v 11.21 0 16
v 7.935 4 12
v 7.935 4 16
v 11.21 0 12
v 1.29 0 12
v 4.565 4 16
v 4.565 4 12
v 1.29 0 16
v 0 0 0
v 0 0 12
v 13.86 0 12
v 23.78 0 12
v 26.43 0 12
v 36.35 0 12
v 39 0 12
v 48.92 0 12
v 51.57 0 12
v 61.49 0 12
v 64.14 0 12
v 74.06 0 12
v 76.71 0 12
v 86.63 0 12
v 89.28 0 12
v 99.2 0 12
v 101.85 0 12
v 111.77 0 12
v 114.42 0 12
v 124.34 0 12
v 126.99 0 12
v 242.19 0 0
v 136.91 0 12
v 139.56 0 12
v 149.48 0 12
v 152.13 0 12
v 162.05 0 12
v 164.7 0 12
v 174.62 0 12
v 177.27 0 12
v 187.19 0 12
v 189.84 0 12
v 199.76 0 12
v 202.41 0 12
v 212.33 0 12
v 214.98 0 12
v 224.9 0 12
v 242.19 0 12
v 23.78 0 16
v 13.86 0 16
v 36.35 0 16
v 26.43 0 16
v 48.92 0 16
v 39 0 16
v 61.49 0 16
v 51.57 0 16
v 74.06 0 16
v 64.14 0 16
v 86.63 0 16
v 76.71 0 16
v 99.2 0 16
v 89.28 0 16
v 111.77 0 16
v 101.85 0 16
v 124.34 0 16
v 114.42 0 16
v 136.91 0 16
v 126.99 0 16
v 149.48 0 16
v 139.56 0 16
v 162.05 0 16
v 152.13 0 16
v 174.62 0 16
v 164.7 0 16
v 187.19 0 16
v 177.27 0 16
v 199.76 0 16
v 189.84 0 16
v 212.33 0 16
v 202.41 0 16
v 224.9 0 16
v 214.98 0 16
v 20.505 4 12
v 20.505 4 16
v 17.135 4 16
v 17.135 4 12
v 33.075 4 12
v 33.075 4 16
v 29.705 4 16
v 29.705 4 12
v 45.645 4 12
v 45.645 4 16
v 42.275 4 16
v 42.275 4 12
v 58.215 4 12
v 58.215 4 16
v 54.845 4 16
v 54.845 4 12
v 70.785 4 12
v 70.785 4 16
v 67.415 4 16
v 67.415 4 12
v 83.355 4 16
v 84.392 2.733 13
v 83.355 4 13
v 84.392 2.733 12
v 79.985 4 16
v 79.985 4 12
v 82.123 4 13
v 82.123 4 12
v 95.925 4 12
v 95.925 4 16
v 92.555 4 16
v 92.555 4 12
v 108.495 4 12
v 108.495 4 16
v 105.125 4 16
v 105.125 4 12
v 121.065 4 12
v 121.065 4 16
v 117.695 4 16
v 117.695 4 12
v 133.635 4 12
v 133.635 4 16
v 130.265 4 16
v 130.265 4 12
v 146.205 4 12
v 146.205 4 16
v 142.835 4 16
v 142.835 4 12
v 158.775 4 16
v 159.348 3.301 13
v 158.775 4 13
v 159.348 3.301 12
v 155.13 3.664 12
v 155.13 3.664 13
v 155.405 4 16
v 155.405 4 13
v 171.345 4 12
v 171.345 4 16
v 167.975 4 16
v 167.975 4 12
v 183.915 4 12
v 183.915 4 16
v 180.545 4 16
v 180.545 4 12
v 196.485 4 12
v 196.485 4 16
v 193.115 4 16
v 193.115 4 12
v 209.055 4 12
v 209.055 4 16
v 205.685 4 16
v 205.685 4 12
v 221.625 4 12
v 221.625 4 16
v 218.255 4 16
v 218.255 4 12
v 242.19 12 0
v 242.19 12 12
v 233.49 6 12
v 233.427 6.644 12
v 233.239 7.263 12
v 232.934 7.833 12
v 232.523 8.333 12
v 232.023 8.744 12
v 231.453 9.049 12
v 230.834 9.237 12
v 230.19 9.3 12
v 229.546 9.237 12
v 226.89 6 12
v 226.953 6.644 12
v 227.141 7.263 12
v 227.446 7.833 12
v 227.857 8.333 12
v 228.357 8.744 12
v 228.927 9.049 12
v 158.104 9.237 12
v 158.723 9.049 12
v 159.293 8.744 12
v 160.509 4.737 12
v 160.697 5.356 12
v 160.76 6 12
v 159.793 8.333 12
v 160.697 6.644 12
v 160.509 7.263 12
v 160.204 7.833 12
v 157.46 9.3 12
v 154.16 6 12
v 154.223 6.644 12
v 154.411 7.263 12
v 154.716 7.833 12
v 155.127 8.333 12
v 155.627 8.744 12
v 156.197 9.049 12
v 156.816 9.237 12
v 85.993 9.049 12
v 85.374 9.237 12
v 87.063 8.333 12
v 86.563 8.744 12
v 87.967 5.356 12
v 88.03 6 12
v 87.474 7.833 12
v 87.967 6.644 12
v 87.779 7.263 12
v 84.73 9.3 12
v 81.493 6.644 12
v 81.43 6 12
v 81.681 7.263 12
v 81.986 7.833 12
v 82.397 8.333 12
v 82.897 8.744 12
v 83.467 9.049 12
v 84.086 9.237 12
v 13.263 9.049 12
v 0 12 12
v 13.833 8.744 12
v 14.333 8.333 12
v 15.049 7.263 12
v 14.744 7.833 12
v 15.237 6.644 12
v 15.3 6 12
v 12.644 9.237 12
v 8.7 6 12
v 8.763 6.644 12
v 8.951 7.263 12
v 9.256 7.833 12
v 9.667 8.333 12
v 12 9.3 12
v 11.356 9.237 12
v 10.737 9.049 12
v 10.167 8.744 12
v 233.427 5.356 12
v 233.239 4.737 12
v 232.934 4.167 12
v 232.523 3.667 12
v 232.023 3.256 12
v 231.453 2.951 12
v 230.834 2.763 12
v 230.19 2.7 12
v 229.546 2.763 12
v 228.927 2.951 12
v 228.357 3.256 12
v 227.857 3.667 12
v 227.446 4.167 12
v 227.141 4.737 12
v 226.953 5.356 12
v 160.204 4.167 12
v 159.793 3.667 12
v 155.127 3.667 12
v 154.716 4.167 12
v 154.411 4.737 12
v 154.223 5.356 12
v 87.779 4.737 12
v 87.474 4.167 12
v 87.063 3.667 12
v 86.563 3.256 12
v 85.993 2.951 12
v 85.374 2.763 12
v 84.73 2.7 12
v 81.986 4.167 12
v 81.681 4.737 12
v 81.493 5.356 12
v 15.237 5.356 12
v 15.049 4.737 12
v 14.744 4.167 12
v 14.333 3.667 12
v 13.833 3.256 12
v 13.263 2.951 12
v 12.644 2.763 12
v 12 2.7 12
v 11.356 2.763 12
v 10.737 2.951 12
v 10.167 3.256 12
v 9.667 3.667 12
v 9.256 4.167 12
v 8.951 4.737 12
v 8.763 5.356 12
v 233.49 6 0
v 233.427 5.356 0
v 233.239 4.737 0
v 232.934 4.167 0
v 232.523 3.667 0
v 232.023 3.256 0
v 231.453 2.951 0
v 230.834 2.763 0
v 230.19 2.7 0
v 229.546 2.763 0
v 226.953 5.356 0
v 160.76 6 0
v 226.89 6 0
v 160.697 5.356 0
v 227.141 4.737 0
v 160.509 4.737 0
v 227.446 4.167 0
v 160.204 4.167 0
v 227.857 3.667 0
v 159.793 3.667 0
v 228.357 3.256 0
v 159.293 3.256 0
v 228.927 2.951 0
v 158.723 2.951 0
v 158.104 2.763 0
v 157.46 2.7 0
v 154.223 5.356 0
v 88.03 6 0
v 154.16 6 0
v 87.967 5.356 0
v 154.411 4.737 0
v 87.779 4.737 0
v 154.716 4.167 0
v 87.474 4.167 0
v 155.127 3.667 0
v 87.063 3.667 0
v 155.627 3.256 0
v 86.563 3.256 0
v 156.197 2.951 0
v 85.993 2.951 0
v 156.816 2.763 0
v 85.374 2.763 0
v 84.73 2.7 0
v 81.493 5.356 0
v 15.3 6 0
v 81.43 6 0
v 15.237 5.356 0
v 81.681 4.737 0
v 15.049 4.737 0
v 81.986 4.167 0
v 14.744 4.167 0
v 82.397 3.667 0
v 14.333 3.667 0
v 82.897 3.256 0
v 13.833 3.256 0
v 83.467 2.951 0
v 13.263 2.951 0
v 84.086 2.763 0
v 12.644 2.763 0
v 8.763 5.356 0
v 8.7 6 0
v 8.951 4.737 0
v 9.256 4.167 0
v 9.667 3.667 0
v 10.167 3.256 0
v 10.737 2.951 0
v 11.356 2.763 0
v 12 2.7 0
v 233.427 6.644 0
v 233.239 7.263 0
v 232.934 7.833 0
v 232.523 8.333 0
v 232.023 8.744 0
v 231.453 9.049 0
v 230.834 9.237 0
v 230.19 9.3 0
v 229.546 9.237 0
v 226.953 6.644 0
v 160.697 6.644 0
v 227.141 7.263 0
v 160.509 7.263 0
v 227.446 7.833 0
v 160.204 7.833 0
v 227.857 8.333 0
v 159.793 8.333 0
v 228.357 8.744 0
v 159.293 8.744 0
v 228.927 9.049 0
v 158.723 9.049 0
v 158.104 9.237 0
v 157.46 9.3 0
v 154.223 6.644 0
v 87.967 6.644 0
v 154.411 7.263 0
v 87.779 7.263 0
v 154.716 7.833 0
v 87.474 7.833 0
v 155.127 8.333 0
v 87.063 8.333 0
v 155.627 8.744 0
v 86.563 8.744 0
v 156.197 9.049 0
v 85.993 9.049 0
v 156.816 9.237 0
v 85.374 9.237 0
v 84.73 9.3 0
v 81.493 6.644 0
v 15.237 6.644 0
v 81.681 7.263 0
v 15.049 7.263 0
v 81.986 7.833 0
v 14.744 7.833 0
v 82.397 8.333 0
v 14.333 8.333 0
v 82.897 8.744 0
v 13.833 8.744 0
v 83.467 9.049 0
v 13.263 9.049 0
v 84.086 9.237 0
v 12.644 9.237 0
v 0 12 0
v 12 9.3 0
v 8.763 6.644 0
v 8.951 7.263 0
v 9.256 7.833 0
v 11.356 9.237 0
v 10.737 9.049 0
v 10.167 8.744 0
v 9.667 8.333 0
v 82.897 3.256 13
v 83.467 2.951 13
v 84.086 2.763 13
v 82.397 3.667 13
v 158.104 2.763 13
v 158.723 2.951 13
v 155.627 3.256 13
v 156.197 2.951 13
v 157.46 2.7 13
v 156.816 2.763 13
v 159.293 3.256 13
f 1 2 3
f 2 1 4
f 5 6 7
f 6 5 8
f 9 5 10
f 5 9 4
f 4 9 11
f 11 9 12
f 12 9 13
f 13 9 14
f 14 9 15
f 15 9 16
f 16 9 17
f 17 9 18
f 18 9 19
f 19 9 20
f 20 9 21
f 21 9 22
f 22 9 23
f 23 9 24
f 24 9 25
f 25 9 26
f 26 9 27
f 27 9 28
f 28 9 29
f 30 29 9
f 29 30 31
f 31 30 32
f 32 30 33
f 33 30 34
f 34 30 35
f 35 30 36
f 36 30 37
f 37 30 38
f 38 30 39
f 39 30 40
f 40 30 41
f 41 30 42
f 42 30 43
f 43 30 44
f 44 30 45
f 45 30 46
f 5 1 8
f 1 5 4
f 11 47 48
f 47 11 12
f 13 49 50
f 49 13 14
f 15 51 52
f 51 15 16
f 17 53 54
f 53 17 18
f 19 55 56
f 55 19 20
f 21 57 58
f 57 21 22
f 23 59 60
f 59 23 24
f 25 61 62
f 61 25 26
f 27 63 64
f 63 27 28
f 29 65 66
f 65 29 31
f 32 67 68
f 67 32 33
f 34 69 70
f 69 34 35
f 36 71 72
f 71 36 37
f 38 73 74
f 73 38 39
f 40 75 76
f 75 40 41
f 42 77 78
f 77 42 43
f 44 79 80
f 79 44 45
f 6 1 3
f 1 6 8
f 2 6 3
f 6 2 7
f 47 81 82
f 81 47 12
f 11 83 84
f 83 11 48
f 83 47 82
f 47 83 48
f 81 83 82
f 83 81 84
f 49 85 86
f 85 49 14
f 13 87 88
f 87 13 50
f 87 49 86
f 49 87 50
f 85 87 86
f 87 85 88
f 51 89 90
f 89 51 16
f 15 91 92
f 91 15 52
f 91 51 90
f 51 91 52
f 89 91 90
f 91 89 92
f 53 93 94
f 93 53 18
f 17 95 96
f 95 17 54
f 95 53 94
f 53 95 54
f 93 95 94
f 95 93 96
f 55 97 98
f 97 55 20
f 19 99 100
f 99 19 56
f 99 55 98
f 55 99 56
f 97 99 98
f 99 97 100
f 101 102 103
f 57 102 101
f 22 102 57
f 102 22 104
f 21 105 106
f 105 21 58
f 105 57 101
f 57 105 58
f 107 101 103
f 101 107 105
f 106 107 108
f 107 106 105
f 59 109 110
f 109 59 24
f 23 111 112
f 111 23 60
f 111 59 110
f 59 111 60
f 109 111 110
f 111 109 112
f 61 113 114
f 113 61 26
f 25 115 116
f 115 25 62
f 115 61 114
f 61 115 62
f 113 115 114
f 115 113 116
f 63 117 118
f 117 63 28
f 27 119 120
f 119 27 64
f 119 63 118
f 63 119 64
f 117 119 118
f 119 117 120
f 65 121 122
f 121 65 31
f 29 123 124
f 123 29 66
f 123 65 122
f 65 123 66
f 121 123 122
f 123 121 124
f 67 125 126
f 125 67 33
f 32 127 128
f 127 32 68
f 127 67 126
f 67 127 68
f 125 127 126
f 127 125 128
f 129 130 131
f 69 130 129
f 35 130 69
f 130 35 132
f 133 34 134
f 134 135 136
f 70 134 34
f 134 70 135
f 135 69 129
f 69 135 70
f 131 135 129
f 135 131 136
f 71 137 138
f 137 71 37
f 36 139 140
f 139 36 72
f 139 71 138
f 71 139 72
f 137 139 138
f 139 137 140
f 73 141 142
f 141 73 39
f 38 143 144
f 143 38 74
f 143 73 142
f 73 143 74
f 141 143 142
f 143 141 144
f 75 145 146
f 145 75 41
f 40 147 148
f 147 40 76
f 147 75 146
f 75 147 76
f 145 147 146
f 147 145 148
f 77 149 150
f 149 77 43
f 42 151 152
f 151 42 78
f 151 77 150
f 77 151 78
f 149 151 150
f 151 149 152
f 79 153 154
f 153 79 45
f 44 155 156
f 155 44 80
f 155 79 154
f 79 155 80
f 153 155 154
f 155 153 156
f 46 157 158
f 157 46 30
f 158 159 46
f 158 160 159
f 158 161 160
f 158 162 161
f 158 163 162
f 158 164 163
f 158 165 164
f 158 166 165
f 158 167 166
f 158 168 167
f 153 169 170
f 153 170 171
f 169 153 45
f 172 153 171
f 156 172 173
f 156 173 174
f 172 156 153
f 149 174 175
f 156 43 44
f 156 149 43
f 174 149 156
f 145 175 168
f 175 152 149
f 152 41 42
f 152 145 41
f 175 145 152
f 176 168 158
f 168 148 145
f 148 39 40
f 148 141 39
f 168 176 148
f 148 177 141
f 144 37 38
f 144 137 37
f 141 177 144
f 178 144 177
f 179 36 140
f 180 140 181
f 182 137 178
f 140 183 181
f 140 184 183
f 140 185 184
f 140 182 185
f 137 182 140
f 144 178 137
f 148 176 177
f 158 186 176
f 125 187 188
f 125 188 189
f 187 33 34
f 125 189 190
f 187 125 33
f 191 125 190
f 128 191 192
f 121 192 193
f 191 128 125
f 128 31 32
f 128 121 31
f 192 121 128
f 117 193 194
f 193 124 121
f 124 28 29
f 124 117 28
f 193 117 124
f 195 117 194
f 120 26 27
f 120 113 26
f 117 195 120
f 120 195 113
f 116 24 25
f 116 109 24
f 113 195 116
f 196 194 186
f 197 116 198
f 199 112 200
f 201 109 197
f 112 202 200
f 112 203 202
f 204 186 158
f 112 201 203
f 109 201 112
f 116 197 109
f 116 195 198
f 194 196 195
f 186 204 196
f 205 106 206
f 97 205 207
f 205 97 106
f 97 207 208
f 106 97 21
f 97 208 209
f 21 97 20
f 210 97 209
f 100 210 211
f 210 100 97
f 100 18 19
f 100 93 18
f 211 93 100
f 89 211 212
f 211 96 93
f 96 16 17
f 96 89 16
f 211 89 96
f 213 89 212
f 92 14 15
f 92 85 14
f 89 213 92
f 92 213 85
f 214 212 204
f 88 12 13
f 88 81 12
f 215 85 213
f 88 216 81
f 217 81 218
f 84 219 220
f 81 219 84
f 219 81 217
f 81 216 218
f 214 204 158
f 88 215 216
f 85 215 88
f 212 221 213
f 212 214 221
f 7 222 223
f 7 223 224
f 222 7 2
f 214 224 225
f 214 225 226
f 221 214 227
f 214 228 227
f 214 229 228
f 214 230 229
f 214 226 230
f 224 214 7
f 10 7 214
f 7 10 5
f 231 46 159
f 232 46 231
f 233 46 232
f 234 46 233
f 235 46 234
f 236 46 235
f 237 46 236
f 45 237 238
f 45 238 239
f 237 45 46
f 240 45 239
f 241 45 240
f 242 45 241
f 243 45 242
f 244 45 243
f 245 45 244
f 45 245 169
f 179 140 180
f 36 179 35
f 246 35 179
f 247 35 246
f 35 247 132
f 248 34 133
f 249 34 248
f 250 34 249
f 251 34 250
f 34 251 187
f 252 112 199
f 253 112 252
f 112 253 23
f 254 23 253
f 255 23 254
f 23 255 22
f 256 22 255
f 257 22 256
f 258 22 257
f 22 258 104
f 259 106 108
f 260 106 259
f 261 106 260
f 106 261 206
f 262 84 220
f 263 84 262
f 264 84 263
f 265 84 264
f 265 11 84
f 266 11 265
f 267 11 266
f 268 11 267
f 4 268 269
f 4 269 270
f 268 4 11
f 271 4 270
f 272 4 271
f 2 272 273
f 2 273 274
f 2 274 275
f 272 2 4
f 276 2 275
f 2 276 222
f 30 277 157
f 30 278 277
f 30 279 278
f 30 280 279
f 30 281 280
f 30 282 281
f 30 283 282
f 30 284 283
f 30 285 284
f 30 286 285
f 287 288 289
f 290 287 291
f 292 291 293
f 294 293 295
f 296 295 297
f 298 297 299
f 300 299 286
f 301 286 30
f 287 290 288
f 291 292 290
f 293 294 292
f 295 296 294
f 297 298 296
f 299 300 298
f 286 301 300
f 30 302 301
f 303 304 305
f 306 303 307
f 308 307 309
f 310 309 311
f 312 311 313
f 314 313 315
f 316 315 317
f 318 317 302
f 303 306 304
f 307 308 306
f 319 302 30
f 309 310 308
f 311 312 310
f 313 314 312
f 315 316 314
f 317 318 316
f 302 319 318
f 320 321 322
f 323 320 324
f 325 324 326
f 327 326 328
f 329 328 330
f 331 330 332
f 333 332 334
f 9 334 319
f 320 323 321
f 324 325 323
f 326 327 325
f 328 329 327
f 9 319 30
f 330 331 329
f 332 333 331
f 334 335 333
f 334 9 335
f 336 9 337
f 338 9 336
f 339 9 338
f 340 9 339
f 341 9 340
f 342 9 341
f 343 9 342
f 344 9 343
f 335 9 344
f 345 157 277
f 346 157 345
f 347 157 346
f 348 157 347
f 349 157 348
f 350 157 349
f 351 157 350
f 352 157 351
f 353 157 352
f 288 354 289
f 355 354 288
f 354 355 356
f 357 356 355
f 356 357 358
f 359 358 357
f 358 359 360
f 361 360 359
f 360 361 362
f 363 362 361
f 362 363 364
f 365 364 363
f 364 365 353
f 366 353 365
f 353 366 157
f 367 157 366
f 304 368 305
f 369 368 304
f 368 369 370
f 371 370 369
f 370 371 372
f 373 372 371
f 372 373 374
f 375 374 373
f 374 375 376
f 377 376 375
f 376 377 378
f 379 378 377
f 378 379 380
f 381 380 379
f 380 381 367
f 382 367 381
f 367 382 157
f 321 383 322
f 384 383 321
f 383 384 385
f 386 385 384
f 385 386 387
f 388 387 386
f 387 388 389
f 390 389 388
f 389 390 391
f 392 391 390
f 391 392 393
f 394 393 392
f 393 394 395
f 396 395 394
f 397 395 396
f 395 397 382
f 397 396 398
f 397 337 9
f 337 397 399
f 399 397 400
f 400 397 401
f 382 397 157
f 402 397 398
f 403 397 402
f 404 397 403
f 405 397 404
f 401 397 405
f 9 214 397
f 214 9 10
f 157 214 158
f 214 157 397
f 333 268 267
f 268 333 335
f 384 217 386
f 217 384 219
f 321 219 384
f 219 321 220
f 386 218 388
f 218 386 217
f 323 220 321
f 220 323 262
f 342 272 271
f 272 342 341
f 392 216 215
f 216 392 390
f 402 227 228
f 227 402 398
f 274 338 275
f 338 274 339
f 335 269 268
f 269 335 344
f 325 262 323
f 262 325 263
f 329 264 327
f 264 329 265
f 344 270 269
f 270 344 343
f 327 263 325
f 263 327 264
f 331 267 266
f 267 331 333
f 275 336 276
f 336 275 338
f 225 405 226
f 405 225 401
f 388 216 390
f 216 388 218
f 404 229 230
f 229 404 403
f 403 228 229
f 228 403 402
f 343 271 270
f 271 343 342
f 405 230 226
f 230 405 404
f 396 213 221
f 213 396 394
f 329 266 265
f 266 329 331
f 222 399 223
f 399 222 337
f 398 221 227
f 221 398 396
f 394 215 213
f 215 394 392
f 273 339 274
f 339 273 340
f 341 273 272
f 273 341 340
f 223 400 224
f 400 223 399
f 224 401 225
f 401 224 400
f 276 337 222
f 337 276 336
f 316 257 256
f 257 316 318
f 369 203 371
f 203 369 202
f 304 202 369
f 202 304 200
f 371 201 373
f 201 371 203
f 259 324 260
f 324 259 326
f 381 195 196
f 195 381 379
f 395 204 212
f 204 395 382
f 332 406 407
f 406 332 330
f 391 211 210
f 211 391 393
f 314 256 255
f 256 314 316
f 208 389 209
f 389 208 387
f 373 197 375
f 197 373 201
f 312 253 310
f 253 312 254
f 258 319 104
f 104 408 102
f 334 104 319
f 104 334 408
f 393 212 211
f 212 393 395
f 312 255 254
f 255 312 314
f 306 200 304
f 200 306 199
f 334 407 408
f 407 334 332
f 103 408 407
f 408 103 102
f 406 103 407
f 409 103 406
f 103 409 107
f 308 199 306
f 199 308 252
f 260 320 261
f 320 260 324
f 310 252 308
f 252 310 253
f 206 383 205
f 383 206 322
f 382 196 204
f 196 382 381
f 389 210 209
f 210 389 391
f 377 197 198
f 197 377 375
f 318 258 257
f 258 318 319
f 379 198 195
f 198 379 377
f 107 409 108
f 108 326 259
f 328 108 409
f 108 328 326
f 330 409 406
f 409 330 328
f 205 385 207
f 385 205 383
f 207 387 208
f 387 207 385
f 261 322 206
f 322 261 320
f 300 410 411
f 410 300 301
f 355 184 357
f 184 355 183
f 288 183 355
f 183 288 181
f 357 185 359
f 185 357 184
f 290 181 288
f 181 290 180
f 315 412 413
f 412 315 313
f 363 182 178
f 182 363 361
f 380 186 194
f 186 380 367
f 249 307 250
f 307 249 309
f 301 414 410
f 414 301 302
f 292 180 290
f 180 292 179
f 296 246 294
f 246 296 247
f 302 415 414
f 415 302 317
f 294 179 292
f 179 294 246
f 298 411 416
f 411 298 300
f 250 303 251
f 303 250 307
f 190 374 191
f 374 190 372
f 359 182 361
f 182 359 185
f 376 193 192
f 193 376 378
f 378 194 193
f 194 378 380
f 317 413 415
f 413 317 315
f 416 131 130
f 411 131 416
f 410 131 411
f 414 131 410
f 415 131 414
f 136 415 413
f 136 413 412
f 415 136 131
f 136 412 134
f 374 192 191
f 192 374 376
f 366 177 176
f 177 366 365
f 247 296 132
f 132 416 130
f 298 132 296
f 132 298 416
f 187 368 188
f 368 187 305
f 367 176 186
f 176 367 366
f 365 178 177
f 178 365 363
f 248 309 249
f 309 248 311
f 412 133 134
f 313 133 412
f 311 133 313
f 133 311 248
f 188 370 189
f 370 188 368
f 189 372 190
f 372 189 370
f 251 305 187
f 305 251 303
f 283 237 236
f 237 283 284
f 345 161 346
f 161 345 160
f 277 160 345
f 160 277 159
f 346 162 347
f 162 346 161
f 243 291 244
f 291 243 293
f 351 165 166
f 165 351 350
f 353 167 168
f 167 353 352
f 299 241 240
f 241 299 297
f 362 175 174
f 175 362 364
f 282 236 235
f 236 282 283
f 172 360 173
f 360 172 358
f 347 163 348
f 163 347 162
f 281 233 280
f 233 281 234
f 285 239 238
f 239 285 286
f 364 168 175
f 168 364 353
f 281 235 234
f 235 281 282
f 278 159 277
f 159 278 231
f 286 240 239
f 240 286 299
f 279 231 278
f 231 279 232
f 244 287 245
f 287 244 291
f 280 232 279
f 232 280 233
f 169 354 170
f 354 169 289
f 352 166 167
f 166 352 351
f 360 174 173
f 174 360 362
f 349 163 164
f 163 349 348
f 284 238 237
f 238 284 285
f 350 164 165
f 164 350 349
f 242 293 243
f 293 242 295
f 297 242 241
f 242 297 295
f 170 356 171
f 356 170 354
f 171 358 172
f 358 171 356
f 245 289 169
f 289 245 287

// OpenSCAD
$fn = 32;

// ----------------------------------------------------------------------
// Gear rack: m=4 z=18, 242.19 x 12 x 16 mm
// ----------------------------------------------------------------------

// --- parameters (mm) ---
length = 242.19;          // rack length, X
width = 12;               // rack width, Y
height = 16;              // overall height, Z
module_m = 4;             // module
back_t = 12;              // tooth root line height
pitch = 12.57;            // circular pitch
tip_w = 3.37;             // tooth thickness at the tip
root_w = 9.92;            // tooth thickness at the root line
hole_d = 6.6;             // mounting hole
sink = 0.6;               // tooth root overlap into the body

tooth_span = 226.19;

module tooth(x0) {
  /* 20 deg flank profile, sunk into the body for a positive overlap */
  translate([x0, 0, back_t - sink])
    linear_extrude(height = height - back_t + sink)
      polygon(points = [[-root_w / 2, 0], [root_w / 2, 0],
                        [tip_w / 2, height - back_t],
                        [-tip_w / 2, height - back_t]]);
}

difference() {
  union() {
    cube([length, width, back_t]);
    for (i = [0 : 18 - 1])
      tooth((i + 0.5) * pitch + (tooth_span - 18 * pitch) / 2);
  }
  translate([12, 6, -1]) cylinder(h = back_t + 2, d = hole_d);
  translate([84.73, 6, -1]) cylinder(h = back_t + 2, d = hole_d);
  translate([157.46, 6, -1]) cylinder(h = back_t + 2, d = hole_d);
  translate([230.19, 6, -1]) cylinder(h = back_t + 2, d = hole_d);
}
